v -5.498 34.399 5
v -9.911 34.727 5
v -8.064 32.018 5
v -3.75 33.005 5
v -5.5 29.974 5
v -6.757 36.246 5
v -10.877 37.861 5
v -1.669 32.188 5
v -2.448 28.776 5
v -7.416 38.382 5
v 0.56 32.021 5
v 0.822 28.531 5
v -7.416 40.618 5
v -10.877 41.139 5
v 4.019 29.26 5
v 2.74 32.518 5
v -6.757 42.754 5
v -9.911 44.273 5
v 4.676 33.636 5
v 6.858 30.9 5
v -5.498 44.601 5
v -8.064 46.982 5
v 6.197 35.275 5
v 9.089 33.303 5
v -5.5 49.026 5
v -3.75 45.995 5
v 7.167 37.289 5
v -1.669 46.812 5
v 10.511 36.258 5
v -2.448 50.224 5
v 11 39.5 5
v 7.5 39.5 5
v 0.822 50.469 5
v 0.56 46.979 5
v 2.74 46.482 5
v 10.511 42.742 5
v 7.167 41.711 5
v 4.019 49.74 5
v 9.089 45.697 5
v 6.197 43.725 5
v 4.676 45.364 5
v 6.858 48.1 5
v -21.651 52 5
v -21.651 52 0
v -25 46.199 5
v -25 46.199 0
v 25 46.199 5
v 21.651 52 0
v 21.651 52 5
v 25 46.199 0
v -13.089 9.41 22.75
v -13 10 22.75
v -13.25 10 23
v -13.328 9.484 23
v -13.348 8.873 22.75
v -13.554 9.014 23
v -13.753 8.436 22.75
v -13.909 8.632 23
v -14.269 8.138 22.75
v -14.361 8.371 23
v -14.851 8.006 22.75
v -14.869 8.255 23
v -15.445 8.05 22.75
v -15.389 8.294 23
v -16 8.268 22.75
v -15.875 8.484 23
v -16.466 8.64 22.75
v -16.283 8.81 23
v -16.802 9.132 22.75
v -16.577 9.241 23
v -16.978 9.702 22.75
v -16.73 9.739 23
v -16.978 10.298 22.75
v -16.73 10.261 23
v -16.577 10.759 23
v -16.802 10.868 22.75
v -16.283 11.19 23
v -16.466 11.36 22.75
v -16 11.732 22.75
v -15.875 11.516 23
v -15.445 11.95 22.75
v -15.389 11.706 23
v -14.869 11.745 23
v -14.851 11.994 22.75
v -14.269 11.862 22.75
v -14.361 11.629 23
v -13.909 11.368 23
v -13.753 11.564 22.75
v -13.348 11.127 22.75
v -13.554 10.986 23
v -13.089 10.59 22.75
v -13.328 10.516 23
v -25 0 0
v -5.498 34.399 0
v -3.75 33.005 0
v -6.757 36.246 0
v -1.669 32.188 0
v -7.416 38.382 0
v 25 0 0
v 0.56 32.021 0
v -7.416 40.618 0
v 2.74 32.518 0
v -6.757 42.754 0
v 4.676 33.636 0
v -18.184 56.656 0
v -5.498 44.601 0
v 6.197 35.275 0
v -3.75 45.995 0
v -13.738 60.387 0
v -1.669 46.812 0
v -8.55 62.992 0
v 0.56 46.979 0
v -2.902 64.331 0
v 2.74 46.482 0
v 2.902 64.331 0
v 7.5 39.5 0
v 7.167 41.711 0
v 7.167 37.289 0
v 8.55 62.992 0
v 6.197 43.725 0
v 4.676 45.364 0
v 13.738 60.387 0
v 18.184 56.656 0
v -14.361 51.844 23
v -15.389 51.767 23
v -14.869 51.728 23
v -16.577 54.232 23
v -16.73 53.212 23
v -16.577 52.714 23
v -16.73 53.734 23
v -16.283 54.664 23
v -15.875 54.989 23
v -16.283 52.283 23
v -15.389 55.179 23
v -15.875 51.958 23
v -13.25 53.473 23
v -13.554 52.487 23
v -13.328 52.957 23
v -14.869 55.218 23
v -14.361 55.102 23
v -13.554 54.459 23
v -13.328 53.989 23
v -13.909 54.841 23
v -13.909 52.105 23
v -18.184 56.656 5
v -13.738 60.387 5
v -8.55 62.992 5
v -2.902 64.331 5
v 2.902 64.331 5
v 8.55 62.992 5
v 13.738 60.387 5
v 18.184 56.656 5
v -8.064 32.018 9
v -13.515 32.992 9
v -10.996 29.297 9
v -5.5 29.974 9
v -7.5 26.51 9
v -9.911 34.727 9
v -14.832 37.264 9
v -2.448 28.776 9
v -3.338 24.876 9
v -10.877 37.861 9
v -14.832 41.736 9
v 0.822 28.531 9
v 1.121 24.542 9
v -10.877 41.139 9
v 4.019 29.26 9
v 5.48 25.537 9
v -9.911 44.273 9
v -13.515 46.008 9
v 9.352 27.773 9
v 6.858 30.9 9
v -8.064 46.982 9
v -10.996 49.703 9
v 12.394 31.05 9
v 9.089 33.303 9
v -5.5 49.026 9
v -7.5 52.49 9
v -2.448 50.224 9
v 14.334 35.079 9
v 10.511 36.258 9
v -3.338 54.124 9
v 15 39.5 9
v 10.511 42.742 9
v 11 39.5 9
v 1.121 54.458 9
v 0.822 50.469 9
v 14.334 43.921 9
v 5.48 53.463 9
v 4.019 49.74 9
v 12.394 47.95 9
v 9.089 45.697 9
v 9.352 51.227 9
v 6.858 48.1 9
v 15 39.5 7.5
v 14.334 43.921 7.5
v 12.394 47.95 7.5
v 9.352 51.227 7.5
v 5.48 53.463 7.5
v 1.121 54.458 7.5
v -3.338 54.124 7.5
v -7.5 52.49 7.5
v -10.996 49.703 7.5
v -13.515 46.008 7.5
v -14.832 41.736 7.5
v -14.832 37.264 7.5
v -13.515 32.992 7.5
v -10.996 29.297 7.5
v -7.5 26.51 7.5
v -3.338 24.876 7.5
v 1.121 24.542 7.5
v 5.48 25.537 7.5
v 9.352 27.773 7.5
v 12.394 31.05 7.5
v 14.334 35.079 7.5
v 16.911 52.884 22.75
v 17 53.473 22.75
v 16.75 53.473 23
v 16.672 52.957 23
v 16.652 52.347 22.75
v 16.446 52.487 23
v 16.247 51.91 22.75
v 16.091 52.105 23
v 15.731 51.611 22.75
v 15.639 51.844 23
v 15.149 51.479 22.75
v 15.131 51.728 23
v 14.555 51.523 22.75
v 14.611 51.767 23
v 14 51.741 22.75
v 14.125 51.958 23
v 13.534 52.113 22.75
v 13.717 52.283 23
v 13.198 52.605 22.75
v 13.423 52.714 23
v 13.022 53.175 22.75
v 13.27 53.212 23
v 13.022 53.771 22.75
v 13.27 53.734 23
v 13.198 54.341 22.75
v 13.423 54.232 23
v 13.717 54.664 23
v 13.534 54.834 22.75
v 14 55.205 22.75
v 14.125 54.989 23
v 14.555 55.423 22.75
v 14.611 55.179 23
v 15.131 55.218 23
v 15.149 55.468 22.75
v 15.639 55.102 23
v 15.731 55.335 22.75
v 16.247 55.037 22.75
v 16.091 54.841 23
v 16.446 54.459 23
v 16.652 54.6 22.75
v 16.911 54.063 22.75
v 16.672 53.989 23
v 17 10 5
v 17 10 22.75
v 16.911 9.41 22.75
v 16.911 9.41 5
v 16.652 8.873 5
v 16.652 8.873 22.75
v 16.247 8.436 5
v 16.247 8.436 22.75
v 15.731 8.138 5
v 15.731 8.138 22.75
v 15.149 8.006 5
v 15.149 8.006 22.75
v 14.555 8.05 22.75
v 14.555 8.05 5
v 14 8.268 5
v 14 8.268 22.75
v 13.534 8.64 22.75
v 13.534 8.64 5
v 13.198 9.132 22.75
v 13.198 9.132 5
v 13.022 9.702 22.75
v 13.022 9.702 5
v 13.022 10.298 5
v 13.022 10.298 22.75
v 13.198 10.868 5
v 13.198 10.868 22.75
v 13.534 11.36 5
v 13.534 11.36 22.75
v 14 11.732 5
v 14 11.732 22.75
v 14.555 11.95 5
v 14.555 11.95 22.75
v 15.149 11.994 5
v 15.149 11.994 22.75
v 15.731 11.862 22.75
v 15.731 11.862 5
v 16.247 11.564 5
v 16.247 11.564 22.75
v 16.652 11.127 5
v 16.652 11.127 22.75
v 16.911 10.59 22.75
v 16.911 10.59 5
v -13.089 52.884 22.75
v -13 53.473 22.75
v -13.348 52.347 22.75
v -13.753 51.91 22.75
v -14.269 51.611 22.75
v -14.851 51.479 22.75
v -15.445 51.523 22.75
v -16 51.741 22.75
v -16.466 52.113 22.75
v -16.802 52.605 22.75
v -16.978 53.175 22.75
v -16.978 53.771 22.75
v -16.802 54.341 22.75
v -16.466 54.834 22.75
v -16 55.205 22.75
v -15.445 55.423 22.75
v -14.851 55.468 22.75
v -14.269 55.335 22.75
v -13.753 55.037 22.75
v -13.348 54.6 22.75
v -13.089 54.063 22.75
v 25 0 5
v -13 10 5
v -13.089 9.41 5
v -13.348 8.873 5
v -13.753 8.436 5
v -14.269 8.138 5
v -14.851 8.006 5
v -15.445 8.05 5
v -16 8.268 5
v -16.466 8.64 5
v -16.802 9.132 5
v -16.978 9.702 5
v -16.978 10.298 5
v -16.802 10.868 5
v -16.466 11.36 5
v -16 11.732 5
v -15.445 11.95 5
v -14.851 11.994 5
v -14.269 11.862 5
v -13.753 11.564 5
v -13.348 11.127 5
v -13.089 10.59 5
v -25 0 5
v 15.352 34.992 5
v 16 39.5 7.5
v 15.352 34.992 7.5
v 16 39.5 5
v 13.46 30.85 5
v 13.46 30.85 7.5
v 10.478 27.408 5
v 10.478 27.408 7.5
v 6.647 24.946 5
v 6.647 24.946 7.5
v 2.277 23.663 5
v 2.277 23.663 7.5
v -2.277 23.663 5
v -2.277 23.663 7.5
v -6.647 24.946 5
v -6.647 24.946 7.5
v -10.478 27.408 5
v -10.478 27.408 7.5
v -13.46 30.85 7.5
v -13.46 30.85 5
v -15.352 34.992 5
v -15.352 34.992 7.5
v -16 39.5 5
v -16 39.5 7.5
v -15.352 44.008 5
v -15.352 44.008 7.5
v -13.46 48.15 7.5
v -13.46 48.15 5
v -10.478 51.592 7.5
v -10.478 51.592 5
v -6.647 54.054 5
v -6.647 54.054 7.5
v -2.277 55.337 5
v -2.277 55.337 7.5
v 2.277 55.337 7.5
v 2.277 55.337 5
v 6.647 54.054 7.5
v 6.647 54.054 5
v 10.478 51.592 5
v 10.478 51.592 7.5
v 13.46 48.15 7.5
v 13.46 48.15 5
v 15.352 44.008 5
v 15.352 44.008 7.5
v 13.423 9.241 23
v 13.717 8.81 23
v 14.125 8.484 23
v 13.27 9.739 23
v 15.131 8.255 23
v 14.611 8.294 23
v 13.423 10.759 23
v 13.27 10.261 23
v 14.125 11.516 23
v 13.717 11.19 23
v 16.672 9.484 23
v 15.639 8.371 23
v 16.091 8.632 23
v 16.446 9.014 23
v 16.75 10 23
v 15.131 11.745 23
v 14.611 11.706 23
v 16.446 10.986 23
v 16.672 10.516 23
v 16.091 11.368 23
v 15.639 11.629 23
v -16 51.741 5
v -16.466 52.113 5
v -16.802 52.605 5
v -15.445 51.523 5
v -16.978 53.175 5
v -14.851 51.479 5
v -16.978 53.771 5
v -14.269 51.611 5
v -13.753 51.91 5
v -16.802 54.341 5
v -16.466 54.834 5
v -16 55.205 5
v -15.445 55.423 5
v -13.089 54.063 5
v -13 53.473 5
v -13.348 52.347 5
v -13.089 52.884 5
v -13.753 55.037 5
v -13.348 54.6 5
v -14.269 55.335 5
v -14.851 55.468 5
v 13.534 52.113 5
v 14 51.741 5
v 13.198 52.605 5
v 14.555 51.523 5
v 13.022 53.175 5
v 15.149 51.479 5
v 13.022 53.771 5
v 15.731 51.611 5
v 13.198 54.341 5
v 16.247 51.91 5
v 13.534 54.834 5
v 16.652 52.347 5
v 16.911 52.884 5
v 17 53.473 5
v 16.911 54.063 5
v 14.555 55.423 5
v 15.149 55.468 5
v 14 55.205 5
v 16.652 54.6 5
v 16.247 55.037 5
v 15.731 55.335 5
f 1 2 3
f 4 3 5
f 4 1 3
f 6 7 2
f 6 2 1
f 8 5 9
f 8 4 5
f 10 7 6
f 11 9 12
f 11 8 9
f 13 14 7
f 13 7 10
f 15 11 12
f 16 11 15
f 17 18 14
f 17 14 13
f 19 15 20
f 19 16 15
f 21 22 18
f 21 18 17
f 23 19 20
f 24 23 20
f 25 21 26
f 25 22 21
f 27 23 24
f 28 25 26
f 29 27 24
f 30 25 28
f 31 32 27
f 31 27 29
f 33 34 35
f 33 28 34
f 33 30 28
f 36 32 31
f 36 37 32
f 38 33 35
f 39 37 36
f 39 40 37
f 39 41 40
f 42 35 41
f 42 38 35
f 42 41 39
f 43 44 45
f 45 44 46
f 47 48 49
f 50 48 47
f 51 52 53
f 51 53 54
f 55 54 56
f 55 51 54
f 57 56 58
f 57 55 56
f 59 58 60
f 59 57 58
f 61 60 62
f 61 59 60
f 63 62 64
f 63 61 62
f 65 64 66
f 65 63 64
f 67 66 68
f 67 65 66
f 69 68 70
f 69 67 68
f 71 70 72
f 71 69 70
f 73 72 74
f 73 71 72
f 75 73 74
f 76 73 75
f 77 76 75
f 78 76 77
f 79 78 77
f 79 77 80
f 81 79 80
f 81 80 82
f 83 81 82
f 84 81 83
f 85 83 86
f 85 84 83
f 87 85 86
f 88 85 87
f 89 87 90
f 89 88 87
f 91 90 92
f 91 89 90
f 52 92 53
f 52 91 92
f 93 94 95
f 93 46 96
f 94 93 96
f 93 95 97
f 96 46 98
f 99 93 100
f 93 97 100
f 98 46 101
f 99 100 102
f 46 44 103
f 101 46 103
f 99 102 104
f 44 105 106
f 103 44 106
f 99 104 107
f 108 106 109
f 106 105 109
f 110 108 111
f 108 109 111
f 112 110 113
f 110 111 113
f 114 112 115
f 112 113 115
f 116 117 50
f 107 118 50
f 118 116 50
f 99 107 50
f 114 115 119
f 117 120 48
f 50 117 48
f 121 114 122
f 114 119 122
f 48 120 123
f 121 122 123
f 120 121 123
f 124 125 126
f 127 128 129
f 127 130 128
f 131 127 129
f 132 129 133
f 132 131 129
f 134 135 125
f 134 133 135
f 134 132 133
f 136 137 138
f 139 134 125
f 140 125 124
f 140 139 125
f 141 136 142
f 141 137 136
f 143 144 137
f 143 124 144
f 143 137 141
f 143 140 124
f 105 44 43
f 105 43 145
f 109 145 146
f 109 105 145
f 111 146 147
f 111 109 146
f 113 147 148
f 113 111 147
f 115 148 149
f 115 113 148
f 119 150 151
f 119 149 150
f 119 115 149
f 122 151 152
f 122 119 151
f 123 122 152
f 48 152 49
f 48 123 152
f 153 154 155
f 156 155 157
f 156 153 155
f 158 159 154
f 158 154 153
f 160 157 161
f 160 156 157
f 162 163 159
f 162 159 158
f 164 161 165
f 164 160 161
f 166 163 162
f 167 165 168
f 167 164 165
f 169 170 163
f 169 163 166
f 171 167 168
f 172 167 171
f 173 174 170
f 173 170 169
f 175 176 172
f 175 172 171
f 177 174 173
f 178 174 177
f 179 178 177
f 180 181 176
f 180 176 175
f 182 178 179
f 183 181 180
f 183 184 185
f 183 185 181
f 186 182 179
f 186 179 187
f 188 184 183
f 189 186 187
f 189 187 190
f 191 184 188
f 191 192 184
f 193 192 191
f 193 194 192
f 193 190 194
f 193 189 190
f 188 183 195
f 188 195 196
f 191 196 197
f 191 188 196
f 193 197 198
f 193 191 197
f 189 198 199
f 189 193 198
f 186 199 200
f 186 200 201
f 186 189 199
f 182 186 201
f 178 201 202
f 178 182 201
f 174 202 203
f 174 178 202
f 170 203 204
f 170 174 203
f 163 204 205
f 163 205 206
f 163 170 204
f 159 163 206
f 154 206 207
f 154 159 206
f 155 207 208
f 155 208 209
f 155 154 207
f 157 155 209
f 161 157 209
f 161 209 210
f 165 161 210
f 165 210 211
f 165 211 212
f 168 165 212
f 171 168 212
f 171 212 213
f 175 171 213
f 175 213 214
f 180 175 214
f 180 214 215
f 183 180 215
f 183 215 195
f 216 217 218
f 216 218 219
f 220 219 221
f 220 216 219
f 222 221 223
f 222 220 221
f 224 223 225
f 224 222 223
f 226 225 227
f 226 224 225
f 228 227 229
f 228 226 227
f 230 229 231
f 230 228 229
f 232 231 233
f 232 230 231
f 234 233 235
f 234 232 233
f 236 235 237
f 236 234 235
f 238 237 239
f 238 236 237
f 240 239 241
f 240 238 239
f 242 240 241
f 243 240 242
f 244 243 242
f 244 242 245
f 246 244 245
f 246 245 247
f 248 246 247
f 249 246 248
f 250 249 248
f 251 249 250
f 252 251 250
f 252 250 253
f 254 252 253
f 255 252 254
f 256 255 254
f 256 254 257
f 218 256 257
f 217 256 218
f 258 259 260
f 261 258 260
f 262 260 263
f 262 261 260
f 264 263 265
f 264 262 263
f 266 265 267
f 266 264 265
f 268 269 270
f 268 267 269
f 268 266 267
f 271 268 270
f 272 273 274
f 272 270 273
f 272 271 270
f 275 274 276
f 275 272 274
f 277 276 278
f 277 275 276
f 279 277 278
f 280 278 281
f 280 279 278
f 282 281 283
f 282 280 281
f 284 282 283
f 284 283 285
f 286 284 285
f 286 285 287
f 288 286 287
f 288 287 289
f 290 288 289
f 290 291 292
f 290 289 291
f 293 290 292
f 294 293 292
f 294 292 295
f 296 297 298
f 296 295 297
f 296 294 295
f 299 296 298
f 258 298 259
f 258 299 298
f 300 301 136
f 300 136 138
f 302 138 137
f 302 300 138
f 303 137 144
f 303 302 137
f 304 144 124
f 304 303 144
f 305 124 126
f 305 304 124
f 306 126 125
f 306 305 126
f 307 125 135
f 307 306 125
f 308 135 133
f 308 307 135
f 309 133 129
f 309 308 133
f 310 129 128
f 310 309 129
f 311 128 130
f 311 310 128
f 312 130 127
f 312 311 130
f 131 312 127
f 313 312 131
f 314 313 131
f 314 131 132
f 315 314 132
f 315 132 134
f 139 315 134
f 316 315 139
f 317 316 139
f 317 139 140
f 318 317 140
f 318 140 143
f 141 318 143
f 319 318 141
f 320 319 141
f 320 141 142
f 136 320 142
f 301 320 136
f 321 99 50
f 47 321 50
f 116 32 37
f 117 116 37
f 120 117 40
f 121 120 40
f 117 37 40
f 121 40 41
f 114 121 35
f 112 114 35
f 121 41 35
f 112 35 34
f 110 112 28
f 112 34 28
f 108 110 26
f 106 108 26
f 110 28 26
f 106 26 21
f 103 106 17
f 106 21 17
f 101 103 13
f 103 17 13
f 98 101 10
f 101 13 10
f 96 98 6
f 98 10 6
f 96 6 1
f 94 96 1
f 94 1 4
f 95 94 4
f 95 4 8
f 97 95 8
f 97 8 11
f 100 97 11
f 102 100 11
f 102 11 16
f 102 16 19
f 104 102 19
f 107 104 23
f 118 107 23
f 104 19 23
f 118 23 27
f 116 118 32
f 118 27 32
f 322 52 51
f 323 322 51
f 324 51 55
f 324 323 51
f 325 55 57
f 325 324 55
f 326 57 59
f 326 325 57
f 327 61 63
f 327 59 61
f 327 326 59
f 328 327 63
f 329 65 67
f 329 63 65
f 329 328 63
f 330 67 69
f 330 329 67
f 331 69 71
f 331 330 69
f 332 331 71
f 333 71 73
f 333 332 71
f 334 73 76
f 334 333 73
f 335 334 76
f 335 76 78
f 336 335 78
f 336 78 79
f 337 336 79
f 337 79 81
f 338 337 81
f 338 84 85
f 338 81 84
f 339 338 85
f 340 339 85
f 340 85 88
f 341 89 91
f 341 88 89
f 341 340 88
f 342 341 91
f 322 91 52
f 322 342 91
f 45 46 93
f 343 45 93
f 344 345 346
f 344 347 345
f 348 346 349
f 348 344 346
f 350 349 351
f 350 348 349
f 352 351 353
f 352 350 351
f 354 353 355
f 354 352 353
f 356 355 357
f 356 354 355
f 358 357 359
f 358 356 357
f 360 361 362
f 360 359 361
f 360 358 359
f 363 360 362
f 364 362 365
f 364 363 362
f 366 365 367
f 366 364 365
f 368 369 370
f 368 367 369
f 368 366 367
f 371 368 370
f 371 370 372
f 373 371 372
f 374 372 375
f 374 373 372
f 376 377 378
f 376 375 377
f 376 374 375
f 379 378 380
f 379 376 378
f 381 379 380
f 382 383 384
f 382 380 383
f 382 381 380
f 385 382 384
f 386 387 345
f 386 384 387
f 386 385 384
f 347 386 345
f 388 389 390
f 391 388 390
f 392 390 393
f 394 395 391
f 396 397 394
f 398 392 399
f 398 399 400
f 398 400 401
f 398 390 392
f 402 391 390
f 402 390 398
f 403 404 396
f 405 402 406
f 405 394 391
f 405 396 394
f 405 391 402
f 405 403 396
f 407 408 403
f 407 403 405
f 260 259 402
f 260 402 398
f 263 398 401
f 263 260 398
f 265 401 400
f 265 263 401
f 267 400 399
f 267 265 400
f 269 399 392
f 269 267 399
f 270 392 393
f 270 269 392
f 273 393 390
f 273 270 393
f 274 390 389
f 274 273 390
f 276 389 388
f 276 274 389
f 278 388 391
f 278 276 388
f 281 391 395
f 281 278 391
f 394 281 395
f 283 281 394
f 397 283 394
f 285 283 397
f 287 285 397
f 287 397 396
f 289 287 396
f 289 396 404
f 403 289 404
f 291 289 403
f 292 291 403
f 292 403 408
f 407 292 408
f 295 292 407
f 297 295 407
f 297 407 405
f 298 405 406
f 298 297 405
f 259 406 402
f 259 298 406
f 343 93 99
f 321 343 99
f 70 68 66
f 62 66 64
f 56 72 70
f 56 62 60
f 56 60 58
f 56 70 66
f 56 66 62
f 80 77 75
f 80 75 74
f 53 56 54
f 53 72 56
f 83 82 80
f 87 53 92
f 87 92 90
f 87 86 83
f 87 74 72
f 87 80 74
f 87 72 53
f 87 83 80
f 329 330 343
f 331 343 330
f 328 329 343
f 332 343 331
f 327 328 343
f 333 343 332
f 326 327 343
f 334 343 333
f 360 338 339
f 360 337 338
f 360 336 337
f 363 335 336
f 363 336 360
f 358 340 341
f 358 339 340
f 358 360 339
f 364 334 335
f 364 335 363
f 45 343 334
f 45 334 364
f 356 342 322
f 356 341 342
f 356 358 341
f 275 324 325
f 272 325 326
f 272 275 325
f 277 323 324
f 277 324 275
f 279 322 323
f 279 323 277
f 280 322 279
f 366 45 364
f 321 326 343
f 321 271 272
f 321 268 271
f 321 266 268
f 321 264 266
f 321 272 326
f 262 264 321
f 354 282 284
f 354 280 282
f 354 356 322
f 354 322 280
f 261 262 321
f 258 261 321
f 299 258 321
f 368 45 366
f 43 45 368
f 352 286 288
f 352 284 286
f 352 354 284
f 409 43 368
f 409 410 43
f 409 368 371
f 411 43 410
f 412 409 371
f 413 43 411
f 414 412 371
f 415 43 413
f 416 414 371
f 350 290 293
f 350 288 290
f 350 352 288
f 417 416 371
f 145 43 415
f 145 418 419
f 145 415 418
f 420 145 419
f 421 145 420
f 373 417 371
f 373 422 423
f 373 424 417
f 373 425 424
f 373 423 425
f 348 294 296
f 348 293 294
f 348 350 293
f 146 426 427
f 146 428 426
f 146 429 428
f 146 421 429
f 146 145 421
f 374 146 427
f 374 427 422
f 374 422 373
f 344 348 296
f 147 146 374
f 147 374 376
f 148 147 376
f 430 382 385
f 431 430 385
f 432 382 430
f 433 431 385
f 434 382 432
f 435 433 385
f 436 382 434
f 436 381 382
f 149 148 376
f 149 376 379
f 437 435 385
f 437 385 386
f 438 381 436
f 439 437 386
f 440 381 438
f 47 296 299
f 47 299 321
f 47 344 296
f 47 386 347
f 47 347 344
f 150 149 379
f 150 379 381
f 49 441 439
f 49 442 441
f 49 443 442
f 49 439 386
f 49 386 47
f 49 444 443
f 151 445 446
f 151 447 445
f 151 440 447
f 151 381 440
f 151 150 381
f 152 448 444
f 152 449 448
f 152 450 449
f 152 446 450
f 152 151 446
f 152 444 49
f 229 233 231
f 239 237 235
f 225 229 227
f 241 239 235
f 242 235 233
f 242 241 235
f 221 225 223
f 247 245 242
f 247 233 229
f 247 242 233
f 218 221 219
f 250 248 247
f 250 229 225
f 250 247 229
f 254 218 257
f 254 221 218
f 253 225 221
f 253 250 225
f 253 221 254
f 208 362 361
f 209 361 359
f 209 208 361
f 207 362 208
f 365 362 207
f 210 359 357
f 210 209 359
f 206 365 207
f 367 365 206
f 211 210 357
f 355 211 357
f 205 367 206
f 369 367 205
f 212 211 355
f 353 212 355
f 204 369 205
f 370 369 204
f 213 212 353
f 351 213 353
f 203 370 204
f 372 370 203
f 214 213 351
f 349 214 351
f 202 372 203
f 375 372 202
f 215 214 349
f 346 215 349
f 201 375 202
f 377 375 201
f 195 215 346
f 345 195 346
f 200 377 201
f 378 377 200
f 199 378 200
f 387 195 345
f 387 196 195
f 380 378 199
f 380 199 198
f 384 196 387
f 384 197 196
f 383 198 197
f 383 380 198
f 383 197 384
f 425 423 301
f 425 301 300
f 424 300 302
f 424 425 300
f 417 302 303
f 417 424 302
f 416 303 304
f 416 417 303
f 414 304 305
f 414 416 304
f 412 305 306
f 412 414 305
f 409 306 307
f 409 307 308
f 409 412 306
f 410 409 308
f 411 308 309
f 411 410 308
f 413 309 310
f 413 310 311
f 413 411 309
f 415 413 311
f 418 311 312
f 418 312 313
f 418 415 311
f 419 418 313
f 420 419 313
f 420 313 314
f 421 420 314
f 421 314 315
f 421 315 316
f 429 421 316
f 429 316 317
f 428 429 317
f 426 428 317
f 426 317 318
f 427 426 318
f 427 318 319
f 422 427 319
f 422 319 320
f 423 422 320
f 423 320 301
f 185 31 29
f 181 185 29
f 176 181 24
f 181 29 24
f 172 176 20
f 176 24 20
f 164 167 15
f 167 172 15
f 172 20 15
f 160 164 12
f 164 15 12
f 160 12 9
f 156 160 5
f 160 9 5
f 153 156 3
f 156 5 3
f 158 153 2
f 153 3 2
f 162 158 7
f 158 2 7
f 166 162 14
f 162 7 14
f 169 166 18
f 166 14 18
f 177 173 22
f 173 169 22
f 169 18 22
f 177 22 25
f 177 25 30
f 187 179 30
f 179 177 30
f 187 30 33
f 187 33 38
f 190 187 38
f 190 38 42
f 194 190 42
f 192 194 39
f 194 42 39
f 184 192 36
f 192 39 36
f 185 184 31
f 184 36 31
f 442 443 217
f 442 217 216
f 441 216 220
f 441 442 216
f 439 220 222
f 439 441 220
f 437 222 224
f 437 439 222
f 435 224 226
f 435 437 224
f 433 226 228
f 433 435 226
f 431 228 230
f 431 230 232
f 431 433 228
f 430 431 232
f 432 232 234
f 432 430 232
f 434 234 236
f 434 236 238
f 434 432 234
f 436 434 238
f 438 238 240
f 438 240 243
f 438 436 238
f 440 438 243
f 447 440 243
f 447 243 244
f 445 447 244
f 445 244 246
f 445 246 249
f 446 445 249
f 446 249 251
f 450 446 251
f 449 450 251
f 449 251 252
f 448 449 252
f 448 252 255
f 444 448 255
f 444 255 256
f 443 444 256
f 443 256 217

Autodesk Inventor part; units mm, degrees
ref_plane "YZ Plane" through (0, 0, 0) normal (1, 0, 0) x (0, 1, 0)
ref_plane "XZ Plane" through (0, 0, 0) normal (0, 1, 0) x (-1, 0, 0)
ref_plane "XY Plane" through (0, 0, 0) normal (0, 0, 1) x (1, 0, 0)
sketch "草图1" plane through (0, 0, 0) normal (0, 0, 1) x (1, 0, 0)
  circle A0 centre (0, 39.5) radius 25
  line L0 (-25, 46.1987) -> (-25, 0)
  line L1 (-25, 0) -> (25, 0)
  line L2 (25, 0) -> (25, 46.1987)
  line L3 (-21.6506, 52) -> (-51.6728, 0)
  line L4 (21.6506, 52) -> (51.6728, 0)
  line L5 (0, 0) -> (0, -13.7014)
  dimension "d0" = 50
  dimension "d1" = 39.5
  dimension "d2" = 13.7014
  dimension "d3" = 60
extrude "拉伸1" add sketch "草图1" along normal blind 5
sketch "草图2" plane through (0, 0, 5) normal (0, 0, 1) x (1, 0, 0)
  circle A0 centre (0, 39.5) radius 16
  circle A1 centre (0, 39.5) radius 11
  arc A2 (21.6506, 52) -> (-21.6506, 52) centre (0, 39.5) ccw projected
  point P0 (0, 0)
  dimension "d6" = 32
  dimension "d7" = 22
extrude "拉伸2" add sketch "草图2" along normal blind 4
sketch "草图3" plane through (0, 39.5, 9) normal (0, 0, 1) x (1, 0, 0)
  circle A0 centre (0, 0) radius 16
  circle A1 centre (0, 0) radius 15
  circle A2 centre (0, 0) radius 11 projected
  point P0 (0, -39.5)
  dimension "d10" = 32
  dimension "d11" = 30
extrude "拉伸3" cut sketch "草图3" against normal blind 1.5 contours A0
sketch "草图4" plane through (0, 39.5, 5) normal (0, 0, 1) x (1, 0, 0)
  circle A0 centre (0, 0) radius 7.5
  circle A1 centre (0, 0) radius 11 projected
  point P0 (0, -39.5)
  dimension "d14" = 15
extrude "拉伸4" cut sketch "草图4" against normal through all contours A0
sketch "草图5" plane through (0, 0, 5) normal (0, 0, 1) x (1, 0, 0)
  circle A0 centre (15, 10) radius 2
  circle A1 centre (-15, 10) radius 2
  circle A2 centre (15, 53.4732) radius 2
  circle A3 centre (-15, 53.4732) radius 2
  line L0 (25, 0) -> (25, 46.1987) projected
  line L1 (-25, 0) -> (25, 0) projected
  line L2 (-25, 46.1987) -> (-25, 0) projected
  arc A4 (15, 53.4732) -> (-15, 53.4732) centre (0, 39.5) ccw
  circle A5 centre (0, 39.5) radius 7.5 projected
  point P0 (0, 0)
  dimension "d17" = 4
  dimension "d18" = 4
  dimension "d19" = 4
  dimension "d20" = 4
  dimension "d21" = 10
  dimension "d22" = 10
  dimension "d23" = 10
  dimension "d24" = 10
  dimension "d25" = 20.5
  dimension "d26" = 10
  dimension "d27" = 10
extrude "拉伸5" add sketch "草图5" along normal blind 18 contours A0 | A1 | A2 | A3
thread "螺纹1" size "M4x0.7" class "6g" standard "ANSI Metric M Profile" length 6
thread "螺纹2" size "M4x0.7" class "6g" standard "ANSI Metric M Profile" length 6
thread "螺纹3" size "M4x0.7" class "6g" standard "ANSI Metric M Profile" length 6
thread "螺纹4" size "M4x0.7" class "6g" standard "ANSI Metric M Profile" length 6
chamfer "倒角1" distance 0.25 angle 45 4 edges at (-17, 53.4732, 23) (13, 53.4732, 23) (13, 10, 23) (-17, 10, 23)
properties part number "刀轴端盖"
